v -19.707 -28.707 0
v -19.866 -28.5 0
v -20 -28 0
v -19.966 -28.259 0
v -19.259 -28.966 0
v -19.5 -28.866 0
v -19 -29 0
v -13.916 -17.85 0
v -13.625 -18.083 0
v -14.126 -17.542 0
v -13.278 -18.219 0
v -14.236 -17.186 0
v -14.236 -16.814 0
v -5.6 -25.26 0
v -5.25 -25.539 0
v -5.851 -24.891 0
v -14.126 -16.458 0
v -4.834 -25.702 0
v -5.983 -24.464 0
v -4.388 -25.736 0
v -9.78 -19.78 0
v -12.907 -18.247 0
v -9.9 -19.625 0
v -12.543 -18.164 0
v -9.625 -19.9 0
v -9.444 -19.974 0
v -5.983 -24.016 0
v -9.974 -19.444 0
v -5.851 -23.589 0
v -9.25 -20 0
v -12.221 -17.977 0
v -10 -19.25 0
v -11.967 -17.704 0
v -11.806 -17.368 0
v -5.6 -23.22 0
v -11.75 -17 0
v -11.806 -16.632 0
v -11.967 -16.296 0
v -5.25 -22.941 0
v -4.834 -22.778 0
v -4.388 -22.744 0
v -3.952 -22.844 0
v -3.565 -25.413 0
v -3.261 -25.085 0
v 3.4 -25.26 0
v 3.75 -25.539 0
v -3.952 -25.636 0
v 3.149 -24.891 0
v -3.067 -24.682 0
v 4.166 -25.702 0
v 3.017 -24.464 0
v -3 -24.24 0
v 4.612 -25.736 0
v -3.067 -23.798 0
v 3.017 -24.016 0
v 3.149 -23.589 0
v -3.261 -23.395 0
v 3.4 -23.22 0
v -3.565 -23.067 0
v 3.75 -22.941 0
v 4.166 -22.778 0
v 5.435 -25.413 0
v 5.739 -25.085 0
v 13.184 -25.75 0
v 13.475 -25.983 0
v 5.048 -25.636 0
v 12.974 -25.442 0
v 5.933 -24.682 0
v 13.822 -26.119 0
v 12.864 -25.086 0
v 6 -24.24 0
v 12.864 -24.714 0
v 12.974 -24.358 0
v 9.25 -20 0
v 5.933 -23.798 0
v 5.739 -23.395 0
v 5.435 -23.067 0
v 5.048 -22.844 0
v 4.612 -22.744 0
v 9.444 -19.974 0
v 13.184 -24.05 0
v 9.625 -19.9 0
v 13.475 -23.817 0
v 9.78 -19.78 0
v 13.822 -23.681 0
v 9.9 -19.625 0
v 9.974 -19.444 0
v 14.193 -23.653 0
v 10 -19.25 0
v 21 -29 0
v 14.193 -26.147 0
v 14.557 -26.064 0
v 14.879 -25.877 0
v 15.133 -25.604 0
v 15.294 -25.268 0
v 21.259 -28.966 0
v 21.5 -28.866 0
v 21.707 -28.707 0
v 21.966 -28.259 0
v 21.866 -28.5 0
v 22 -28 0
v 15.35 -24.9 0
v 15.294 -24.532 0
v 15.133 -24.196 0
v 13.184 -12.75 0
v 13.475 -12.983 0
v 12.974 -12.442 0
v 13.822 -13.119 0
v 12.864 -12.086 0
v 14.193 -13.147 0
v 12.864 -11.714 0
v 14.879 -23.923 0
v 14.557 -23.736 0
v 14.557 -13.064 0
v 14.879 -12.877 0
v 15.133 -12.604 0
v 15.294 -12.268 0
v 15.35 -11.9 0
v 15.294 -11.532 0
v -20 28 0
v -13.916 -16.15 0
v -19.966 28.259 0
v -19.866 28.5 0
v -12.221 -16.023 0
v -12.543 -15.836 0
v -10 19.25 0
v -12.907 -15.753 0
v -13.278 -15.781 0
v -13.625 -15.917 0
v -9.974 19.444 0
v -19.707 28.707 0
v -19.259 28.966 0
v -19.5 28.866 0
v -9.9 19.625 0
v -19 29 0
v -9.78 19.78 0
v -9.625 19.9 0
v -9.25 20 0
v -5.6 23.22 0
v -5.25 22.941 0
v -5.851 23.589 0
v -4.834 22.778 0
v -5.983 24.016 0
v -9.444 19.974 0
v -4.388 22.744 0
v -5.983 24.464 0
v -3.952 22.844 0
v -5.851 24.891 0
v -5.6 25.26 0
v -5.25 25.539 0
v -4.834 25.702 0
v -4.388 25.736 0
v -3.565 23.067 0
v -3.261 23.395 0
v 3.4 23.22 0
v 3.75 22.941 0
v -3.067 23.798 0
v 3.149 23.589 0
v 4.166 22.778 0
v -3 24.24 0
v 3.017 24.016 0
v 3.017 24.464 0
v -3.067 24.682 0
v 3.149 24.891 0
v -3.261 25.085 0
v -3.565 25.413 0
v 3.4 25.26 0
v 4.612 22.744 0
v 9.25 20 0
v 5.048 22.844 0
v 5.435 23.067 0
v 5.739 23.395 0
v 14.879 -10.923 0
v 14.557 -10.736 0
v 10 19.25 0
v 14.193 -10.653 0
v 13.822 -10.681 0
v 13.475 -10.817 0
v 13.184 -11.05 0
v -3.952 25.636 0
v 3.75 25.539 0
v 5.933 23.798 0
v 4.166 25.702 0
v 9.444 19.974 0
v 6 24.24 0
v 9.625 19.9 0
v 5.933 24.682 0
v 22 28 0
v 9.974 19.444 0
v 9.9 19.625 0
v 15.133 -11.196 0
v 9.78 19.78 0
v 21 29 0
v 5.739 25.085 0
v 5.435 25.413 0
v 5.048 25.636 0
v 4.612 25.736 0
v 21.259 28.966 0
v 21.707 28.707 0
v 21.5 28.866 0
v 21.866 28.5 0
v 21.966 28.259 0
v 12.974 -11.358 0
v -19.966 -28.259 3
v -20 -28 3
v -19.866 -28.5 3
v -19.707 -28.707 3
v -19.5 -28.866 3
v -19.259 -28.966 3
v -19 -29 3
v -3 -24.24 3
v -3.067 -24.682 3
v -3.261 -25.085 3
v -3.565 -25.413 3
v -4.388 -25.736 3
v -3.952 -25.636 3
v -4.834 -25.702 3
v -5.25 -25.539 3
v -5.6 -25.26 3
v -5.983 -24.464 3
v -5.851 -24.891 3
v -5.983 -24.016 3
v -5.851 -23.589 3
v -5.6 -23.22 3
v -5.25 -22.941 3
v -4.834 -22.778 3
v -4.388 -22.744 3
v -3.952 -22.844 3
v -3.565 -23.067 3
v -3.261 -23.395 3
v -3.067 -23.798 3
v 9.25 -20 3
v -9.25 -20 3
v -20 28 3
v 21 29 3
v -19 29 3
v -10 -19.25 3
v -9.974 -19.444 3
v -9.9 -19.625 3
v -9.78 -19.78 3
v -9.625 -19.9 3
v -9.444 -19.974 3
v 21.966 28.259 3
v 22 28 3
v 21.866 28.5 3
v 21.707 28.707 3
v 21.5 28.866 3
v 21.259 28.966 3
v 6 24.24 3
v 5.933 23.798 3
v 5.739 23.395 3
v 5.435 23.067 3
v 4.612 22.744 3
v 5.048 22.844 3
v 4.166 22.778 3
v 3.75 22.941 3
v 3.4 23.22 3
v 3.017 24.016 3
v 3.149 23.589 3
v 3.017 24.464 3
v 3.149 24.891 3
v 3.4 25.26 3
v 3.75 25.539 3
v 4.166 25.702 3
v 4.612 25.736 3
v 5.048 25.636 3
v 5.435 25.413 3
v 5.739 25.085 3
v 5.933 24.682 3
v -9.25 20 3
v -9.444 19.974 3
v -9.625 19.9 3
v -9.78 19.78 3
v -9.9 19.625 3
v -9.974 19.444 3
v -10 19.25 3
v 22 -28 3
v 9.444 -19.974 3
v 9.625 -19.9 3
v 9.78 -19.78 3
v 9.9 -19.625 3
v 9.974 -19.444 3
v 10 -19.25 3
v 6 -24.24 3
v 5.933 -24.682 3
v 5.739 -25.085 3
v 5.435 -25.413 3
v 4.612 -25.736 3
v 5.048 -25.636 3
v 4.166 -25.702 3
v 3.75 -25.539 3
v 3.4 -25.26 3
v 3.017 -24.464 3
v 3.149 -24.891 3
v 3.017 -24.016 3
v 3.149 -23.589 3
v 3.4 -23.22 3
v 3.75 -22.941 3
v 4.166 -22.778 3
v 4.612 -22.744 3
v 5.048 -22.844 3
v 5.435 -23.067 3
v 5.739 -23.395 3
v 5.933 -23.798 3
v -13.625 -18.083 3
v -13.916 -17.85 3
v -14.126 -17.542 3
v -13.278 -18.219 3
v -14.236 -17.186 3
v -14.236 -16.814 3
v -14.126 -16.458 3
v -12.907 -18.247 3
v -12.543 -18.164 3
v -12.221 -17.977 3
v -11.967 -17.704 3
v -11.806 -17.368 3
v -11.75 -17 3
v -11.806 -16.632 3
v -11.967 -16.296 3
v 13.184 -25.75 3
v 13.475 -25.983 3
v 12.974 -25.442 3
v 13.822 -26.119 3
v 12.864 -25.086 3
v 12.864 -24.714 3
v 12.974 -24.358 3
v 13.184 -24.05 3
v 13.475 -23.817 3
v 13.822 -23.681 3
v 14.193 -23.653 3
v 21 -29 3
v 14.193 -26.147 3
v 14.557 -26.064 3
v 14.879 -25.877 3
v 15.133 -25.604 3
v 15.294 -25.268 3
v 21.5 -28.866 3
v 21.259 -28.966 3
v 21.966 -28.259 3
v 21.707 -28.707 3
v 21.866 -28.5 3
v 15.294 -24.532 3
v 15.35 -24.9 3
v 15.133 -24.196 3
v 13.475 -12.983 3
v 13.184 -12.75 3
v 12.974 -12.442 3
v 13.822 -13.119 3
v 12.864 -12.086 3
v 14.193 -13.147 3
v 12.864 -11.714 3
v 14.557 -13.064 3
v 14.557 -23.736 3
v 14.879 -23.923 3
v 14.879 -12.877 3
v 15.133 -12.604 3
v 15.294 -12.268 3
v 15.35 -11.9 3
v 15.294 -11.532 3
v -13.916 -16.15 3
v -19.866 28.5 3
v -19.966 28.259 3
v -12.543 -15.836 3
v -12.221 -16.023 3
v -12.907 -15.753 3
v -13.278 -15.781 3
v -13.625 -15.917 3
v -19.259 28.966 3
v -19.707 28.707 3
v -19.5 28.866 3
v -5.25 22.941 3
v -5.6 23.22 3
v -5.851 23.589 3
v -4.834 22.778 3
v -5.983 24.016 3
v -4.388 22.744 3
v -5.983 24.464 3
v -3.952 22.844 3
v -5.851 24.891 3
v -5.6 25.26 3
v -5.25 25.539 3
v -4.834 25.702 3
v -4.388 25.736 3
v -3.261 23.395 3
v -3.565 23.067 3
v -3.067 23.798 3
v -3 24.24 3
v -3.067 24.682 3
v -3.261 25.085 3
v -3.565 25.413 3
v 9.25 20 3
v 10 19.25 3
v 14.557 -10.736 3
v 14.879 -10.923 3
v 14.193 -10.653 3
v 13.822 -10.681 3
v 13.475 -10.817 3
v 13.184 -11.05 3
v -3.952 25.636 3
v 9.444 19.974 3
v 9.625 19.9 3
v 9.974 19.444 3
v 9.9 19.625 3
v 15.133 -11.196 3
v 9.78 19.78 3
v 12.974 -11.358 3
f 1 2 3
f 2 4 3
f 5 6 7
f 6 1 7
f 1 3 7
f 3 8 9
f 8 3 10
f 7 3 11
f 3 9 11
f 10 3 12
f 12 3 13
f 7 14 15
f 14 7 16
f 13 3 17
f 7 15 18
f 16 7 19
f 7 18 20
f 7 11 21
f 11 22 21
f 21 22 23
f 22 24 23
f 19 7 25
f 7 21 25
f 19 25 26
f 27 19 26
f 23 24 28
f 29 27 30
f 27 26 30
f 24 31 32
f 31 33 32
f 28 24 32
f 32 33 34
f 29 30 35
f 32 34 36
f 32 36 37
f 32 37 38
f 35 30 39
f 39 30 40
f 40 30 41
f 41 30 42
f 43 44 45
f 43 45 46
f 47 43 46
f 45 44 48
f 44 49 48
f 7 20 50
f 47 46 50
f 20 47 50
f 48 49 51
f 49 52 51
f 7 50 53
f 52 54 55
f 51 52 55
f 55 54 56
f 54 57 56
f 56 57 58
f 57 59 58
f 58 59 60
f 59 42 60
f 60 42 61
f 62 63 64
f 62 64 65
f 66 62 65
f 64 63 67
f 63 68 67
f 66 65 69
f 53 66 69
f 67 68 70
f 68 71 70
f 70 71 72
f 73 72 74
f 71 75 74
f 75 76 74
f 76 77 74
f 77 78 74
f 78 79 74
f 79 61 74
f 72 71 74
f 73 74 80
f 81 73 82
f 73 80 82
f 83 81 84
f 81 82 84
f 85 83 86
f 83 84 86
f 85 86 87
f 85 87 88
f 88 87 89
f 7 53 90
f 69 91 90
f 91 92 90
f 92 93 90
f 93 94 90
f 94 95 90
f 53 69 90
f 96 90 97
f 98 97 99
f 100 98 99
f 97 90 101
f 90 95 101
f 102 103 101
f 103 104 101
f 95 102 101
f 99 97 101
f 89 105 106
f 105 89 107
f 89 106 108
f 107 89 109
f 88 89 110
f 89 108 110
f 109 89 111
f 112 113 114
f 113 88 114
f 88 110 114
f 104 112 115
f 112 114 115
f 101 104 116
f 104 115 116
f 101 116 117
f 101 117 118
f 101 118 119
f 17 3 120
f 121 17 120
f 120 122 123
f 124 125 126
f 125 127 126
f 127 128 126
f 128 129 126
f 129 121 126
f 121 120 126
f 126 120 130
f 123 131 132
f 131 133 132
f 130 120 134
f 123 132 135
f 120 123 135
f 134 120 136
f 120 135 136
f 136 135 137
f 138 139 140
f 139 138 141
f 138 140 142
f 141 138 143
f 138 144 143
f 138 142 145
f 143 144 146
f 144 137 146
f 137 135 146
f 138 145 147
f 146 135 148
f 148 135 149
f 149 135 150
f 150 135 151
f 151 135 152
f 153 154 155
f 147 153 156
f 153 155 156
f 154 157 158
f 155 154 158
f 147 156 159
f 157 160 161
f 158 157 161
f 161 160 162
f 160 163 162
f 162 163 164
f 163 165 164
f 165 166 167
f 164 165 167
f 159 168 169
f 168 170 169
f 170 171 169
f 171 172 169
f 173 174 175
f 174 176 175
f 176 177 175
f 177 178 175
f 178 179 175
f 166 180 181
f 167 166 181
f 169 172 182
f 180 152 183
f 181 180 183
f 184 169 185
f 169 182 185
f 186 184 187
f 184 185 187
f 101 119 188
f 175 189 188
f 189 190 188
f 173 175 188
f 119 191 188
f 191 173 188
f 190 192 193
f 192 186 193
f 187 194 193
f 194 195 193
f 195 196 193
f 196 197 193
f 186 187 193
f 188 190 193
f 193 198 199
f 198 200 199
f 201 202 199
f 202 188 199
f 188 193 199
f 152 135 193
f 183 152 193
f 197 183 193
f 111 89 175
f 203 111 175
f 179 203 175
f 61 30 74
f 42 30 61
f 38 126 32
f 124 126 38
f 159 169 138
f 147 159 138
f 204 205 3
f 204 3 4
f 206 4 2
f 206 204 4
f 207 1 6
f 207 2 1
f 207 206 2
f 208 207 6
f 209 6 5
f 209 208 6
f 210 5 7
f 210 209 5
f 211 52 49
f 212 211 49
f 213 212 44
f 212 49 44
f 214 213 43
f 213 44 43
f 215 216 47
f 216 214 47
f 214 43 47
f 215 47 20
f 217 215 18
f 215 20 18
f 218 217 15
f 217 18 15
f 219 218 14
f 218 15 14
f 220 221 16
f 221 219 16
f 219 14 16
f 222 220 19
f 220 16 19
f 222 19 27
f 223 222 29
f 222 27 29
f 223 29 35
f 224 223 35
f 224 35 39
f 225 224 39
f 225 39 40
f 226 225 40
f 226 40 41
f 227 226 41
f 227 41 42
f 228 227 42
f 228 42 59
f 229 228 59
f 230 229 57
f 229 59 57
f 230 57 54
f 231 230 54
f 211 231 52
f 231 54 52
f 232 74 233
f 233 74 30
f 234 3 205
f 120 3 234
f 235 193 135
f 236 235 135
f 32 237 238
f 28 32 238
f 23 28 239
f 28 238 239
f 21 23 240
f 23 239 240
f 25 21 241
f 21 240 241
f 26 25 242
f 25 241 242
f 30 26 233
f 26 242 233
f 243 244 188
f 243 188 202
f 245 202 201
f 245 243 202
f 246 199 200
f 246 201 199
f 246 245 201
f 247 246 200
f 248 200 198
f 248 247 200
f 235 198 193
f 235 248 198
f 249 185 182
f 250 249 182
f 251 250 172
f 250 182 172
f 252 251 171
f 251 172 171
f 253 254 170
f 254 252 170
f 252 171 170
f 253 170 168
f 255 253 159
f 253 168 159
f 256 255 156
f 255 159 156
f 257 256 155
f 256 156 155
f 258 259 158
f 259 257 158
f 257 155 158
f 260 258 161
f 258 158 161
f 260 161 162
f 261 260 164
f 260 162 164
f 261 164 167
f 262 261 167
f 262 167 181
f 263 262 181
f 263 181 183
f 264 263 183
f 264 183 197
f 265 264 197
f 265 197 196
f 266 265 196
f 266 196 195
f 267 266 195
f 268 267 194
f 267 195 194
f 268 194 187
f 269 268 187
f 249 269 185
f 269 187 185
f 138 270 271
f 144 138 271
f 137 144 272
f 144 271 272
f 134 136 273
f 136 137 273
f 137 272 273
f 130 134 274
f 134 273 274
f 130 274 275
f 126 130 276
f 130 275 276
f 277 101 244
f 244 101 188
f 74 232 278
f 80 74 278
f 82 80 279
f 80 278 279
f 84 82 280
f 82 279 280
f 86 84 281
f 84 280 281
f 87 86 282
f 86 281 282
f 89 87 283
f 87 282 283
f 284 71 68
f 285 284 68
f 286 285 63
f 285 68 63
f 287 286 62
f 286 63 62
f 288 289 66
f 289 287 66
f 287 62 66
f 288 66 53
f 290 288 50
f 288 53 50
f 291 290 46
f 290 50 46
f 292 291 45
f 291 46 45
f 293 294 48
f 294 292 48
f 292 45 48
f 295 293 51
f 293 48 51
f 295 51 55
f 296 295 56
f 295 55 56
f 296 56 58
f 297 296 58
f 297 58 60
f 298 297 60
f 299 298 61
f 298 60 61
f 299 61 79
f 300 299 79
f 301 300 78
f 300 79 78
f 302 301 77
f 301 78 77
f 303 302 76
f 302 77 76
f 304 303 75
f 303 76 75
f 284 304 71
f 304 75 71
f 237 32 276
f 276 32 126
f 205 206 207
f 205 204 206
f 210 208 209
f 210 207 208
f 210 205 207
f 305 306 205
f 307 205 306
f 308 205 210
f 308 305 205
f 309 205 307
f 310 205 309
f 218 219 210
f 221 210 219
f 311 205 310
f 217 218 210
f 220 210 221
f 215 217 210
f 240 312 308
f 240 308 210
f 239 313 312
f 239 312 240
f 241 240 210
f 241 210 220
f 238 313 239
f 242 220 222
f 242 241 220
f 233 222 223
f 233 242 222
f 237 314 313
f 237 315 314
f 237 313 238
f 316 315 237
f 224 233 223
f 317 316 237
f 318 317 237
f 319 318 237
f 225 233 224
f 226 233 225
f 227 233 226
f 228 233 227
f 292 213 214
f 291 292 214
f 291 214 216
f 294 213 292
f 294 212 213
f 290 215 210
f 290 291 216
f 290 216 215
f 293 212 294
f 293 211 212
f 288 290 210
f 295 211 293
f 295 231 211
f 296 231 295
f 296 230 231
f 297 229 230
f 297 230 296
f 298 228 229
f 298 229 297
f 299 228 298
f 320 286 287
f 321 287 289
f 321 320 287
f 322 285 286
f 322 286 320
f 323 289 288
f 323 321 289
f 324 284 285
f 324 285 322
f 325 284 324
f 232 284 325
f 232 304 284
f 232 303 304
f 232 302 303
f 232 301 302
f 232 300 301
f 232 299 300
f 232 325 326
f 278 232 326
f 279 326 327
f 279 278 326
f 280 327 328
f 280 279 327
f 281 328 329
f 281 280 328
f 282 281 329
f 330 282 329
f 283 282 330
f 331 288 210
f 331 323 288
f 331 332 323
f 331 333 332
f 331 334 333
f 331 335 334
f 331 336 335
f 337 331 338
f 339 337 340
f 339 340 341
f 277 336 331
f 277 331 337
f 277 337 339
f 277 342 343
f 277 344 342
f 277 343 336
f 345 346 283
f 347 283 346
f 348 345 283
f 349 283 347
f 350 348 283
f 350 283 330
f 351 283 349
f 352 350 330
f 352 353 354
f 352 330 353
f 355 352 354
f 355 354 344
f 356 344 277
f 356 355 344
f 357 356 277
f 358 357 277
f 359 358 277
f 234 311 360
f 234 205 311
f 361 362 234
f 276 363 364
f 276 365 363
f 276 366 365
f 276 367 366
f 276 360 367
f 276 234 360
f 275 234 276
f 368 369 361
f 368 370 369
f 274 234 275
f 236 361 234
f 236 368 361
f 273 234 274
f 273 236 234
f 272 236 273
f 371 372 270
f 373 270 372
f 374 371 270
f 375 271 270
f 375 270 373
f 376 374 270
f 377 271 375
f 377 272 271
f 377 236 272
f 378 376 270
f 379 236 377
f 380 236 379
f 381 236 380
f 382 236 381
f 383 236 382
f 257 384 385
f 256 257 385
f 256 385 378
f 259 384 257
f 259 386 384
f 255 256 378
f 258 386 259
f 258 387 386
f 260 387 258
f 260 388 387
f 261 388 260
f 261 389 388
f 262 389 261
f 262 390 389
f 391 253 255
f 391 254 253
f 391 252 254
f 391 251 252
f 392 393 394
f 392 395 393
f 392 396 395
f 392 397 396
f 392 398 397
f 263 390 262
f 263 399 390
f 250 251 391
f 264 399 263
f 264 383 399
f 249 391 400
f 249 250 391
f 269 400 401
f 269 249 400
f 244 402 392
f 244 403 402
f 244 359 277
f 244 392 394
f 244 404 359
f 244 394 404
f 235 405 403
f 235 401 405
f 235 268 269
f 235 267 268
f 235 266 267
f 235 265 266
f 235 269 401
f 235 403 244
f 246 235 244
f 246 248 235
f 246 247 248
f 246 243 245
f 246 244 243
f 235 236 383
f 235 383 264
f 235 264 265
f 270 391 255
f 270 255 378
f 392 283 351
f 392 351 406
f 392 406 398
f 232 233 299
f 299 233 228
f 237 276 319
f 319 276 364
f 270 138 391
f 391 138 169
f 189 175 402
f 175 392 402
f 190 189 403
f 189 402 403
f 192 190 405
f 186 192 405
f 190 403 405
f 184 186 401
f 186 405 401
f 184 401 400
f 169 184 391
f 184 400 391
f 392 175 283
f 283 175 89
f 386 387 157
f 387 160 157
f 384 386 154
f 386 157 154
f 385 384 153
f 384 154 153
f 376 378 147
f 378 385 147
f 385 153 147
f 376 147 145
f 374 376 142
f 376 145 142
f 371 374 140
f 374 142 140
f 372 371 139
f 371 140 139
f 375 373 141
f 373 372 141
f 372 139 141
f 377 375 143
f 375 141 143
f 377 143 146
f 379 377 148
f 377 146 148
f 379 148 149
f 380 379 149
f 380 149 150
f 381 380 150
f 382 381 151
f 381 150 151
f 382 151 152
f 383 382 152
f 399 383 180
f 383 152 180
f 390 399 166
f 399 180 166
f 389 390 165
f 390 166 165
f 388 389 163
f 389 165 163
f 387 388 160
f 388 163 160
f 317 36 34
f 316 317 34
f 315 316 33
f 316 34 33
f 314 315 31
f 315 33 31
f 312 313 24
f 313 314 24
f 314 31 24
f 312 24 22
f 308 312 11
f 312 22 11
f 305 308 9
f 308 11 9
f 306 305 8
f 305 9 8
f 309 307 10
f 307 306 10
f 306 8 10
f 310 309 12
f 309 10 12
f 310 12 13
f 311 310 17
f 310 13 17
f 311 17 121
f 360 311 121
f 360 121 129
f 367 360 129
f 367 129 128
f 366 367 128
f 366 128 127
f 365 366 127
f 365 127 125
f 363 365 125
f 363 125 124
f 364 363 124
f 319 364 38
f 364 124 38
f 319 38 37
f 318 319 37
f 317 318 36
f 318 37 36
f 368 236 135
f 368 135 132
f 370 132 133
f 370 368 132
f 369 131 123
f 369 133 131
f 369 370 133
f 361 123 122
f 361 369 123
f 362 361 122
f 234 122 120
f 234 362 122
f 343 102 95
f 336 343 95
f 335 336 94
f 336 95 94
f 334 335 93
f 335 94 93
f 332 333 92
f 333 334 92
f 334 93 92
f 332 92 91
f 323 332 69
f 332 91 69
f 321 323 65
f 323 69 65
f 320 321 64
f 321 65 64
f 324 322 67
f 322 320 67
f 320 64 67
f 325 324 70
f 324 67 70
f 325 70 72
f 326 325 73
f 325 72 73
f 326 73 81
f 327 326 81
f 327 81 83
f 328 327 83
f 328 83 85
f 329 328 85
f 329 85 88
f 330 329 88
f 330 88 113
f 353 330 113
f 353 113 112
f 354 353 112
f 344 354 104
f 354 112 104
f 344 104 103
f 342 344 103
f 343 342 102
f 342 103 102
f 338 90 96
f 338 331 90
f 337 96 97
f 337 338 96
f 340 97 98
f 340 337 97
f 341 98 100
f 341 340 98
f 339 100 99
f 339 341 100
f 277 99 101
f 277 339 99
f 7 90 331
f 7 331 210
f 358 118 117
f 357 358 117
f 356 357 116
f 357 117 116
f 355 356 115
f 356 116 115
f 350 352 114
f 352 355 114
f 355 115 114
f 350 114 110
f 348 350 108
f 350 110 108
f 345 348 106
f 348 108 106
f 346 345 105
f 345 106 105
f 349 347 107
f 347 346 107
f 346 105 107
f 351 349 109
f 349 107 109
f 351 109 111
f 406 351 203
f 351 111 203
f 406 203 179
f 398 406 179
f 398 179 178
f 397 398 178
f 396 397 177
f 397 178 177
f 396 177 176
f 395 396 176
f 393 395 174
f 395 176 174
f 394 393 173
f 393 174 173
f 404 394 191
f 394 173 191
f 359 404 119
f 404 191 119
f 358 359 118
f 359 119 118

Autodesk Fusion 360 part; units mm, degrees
sketch "Sketch1" plane through (0, 0, 0) normal (0, 0, 1) x (1, 0, 0)
  line L0 (-10, 20) -> (10, 20)
  circle A0 centre (-4.5, 24.24) radius 1.5
  line L1 (0, 24.24) -> (0, 20) construction
  circle A1 centre (4.5, 24.24) radius 1.5
  line L2 (4.5, 24.24) -> (-4.5, 24.24) construction
  line L3 (0, 0) -> (10.6295, 0) construction
  line L4 (0, 0) -> (0, 5.1011) construction
  line L5 (10, -20) -> (-10, -20)
  line L6 (10, 20) -> (10, -20)
  line L7 (-10, -20) -> (10, 20) construction
  line L8 (22, -29) -> (22, 29)
  line L9 (-10, -20) -> (-10, 20)
  line L10 (10, -20) -> (-10, 20) construction
  line L11 (-20, -29) -> (-20, 29)
  line L12 (22, 29) -> (-20, 29)
  line L13 (22, -29) -> (-20, -29)
  circle A2 centre (-4.5, -24.24) radius 1.5
  circle A3 centre (4.5, -24.24) radius 1.5
  circle A4 centre (-13, -17) radius 1.25
  circle A5 centre (-13, -17) radius 2.5 construction
  line L14 (-10, -20) -> (-13, -20) construction
  line L15 (-13, -20) -> (-13, -17) construction
  line L16 (-10.5, -17) -> (-10, -17) construction
  line L17 (-15.5, -17) -> (-20, -17) construction
  line L18 (-10.5, -17) -> (-13, -17) construction
  circle A6 centre (14.1, -24.9) radius 1.25
  line L19 (14.1, -24.9) -> (14.1, -11.9) construction
  circle A7 centre (14.1, -11.9) radius 1.25
  circle A8 centre (14.1, -11.9) radius 4.1 construction
  circle A9 centre (14.1, -24.9) radius 4.1 construction
  dimension "d3" = 20
  dimension "d4" = 40
  dimension "d6" = 9
  dimension "d8" = 4.24
  dimension "d9" = 3
  dimension "d10" = 3
  dimension "d18" = 9
  dimension "d19" = 10
  dimension "d20" = 12
  dimension "d21" = 2.5
  dimension "d22" = 5
  dimension "d23" = 3
  dimension "d26" = 3
  dimension "d29" = 0.5
  dimension "d31" = 4.5
  dimension "d32" = 2.5
  dimension "d33" = 2.5
  dimension "d34" = 13
  dimension "d35" = 8.2
  dimension "d36" = 8.2
extrude "Extrude1" add sketch "Sketch1" along normal blind 3
fillet "Fillet1" radius 0.75 4 edges at (-10, -20, 1.5) (10, -20, 1.5) (10, 20, 1.5) (-10, 20, 1.5)
fillet "Fillet2" radius 1 4 edges at (-20, -29, 1.5) (22, -29, 1.5) (-20, 29, 1.5) (22, 29, 1.5)
sketch "Laser" plane through (0, 0, 3) normal (0, 0, 1) x (-1, 0, 0)
  arc A0 (-22, -28) -> (-21, -29) centre (-21, -28) ccw
  line L0 (-21, -29) -> (19, -29)
  arc A1 (19, -29) -> (20, -28) centre (19, -28) ccw
  line L1 (20, -28) -> (20, 28)
  arc A2 (20, 28) -> (19, 29) centre (19, 28) ccw
  line L2 (19, 29) -> (-21, 29)
  arc A3 (-21, 29) -> (-22, 28) centre (-21, 28) ccw
  line L3 (-22, 28) -> (-22, -28)
  circle A4 centre (-14.1, 11.9) radius 1.25
  circle A5 centre (4.5, -24.24) radius 1.5
  circle A6 centre (4.5, 24.24) radius 1.5
  circle A7 centre (13, 17) radius 1.25
  circle A8 centre (-4.5, 24.24) radius 1.5
  circle A9 centre (-14.1, 24.9) radius 1.25
  line L4 (-9.25, 20) -> (9.25, 20)
  arc A10 (10, 19.25) -> (9.25, 20) centre (9.25, 19.25) ccw
  line L5 (10, 19.25) -> (10, -19.25)
  arc A11 (9.25, -20) -> (10, -19.25) centre (9.25, -19.25) ccw
  line L6 (9.25, -20) -> (-9.25, -20)
  arc A12 (-10, -19.25) -> (-9.25, -20) centre (-9.25, -19.25) ccw
  line L7 (-10, -19.25) -> (-10, 19.25)
  arc A13 (-9.25, 20) -> (-10, 19.25) centre (-9.25, 19.25) ccw
  circle A14 centre (-4.5, -24.24) radius 1.5
  line L8 (-14.1, 11.9) -> (-14.1, 24.9) construction
  line L9 (-16, 22) -> (-12.2, 22)
  line L10 (-12.2, 22) -> (-12.2, 14.8)
  line L11 (-12.2, 14.8) -> (-16, 14.8)
  line L12 (-16, 14.8) -> (-16, 22)
  line L13 (-16, 22) -> (-12.2, 14.8) construction
  line L14 (-12.2, 22) -> (-16, 14.8) construction
  point P0 (-14.1, 18.4)
equation "d20 = 8 mm + 4 mm"
